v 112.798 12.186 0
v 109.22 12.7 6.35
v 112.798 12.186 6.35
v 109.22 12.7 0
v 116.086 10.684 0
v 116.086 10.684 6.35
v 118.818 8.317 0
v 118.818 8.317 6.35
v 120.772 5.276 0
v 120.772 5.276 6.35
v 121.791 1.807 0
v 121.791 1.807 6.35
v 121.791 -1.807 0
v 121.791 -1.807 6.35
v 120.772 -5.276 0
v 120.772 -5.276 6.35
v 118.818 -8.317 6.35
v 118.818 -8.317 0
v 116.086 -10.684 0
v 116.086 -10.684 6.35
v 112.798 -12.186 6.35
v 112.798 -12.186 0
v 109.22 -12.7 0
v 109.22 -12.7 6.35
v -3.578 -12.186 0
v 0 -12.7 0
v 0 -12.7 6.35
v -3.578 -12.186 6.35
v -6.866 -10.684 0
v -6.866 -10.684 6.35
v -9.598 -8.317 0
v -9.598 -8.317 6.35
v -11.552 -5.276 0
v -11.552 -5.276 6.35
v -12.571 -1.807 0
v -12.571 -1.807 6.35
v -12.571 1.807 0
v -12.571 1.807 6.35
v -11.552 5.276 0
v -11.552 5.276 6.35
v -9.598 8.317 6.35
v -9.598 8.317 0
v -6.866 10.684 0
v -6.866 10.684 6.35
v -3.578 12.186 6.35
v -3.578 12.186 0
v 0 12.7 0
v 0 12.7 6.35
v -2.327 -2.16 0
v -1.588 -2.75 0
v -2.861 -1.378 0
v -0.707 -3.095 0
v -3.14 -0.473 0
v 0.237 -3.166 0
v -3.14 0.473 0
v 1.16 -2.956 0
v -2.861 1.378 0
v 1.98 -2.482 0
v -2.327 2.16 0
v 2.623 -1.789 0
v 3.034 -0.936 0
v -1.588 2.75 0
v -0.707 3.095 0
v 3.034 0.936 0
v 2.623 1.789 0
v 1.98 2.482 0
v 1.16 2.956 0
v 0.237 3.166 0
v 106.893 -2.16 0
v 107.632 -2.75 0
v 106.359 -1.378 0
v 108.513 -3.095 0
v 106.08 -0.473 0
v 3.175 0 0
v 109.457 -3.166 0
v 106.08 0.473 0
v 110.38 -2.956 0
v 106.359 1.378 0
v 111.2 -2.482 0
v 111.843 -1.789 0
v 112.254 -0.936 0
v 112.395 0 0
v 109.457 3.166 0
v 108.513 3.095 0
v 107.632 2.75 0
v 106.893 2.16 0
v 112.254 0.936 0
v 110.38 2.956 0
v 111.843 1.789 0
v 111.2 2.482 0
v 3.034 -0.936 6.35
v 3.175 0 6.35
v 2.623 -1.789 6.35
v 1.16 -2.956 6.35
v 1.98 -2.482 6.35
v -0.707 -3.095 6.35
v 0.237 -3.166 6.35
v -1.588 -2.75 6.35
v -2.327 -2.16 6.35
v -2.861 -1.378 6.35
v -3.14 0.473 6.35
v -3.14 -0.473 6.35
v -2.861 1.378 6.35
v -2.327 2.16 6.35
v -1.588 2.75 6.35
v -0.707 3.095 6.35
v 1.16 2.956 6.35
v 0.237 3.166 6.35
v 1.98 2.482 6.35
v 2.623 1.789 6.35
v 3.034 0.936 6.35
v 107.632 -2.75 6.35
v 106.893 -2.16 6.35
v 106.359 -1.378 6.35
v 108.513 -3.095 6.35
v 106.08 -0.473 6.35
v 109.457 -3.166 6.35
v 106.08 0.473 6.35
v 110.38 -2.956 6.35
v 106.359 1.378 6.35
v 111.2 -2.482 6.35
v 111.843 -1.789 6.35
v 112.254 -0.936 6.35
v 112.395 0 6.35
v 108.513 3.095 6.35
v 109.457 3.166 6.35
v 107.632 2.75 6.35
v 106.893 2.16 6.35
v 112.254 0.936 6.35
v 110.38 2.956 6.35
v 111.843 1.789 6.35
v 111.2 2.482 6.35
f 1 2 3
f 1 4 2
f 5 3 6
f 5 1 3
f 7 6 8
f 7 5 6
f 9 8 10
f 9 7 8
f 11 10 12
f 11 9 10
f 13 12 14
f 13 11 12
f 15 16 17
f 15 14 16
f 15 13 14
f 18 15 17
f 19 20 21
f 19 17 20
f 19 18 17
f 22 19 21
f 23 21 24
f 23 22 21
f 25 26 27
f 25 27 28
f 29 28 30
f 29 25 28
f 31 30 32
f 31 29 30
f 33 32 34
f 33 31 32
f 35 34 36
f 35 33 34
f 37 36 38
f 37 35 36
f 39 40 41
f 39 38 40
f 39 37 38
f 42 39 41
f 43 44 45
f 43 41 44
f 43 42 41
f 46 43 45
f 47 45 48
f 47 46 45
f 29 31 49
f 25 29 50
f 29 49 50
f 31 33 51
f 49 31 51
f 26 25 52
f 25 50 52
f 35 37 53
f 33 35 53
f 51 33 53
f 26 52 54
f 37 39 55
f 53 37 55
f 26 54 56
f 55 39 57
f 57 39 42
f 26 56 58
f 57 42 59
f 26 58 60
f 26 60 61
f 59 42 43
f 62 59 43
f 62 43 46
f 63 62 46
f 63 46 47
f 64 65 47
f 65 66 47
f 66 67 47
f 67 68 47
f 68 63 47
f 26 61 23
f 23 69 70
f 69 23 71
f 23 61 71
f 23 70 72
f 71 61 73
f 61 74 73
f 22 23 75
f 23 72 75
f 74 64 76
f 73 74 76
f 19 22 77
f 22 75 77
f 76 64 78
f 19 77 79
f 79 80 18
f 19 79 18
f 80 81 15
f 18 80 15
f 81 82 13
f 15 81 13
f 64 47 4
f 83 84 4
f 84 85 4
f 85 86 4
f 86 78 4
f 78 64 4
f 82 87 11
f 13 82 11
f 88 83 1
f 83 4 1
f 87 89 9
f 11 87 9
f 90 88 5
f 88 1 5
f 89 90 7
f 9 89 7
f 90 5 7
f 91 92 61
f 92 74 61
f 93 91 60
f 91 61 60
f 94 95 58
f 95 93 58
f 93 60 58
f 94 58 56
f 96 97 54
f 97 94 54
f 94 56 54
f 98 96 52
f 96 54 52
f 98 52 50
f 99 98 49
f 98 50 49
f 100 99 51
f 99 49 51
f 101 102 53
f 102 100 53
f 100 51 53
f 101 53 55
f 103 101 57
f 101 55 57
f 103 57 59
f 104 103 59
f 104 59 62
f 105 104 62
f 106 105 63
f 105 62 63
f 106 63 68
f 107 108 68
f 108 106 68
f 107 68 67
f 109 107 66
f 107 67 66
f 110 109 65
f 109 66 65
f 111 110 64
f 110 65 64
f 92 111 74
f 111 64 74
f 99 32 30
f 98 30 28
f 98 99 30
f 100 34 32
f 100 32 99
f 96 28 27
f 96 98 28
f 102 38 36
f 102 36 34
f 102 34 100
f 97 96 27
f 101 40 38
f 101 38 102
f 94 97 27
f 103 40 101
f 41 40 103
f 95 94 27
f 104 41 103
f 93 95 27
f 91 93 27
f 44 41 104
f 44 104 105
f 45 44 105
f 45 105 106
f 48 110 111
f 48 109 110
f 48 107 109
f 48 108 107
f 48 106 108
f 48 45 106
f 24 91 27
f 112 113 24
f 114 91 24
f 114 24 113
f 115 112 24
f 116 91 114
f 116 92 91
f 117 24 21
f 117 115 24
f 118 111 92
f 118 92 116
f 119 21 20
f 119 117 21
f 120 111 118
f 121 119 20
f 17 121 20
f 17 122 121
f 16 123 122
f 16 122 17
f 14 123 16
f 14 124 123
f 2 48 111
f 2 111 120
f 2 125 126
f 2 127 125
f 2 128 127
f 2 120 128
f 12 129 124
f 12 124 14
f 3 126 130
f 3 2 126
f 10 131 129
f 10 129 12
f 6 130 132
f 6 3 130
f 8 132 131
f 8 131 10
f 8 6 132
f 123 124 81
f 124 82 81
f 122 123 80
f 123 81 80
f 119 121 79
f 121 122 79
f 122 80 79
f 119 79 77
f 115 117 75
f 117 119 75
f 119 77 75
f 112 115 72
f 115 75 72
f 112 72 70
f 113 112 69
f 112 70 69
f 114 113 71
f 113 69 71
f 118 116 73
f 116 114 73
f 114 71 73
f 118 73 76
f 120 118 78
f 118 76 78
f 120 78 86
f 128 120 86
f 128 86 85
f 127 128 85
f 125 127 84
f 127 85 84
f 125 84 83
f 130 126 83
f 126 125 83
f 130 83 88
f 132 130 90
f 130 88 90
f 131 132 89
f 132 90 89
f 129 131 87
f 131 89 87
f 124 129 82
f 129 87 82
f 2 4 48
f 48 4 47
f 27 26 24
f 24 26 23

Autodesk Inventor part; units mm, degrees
ref_plane "YZ Plane" through (0, 0, 0) normal (1, 0, 0) x (0, 1, 0)
ref_plane "XZ Plane" through (0, 0, 0) normal (0, 1, 0) x (-1, 0, 0)
ref_plane "XY Plane" through (0, 0, 0) normal (0, 0, 1) x (1, 0, 0)
sketch "Sketch1" plane through (0, 0, 0) normal (0, 0, 1) x (1, 0, 0)
  line L0 (0, 0) -> (109.22, 0) construction
  line L1 (0, -12.7) -> (109.22, -12.7)
  line L2 (109.22, 12.7) -> (0, 12.7)
  arc A0 (0, 12.7) -> (0, -12.7) centre (0, 0) ccw
  arc A1 (109.22, -12.7) -> (109.22, 12.7) centre (109.22, 0) ccw
  circle A2 centre (0, 0) radius 3.175
  circle A3 centre (109.22, 0) radius 3.175
  point P0 (54.61, 0)
  dimension "d0" = 25.4
  dimension "d1" = 109.22
  dimension "d2" = 6.35
extrude "Extrusion1" add sketch "Sketch1" along normal blind 6.35
properties part number "ScissorHookBar"
